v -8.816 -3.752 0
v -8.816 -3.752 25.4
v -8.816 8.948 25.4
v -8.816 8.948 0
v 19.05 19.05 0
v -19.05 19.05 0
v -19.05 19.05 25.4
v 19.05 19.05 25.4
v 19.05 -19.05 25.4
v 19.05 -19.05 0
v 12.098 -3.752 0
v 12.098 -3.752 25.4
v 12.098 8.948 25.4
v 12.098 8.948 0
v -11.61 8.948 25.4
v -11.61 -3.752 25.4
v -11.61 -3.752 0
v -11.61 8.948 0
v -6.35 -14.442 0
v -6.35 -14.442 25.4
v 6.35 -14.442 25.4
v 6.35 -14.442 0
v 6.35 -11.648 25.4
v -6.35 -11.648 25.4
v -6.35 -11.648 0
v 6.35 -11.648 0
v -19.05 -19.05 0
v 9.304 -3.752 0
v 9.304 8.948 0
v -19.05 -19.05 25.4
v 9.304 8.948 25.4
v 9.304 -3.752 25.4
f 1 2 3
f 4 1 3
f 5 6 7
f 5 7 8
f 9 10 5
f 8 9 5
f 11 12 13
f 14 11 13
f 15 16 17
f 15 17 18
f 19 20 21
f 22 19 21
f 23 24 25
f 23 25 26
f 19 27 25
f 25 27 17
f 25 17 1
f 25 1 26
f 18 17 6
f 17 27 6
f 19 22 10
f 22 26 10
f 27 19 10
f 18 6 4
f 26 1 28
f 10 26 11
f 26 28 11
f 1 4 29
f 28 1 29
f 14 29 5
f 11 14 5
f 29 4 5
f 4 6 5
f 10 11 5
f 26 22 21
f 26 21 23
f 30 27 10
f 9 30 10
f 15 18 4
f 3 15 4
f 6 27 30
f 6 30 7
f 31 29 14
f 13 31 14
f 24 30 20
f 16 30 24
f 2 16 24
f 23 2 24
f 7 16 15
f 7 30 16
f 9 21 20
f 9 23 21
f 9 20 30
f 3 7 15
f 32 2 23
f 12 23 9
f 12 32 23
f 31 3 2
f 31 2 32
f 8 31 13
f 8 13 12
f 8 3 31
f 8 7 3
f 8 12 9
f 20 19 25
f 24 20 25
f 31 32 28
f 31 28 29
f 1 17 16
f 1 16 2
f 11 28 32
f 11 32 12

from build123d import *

# Parameters (mm, degrees)
F0_W     = 38.1
F0_H     = 38.1
F0_W_2   = 12.7
F0_H_2   = 2.794
F0_W_3   = 2.794
F0_H_3   = 12.7
F1_DEPTH = 25.4
F2_DEPTH = 25.4


with BuildPart() as f1:
    # F0 (on Top) → F1 (new body)
    with BuildSketch(Plane.XY):
        Rectangle(F0_W, F0_H)
        with Locations((0, -13.044956)):
            Rectangle(F0_W_2, F0_H_2, mode=Mode.SUBTRACT)
        with Locations((-10.21277, 2.598171)):
            Rectangle(F0_W_3, F0_H_3, mode=Mode.SUBTRACT)
        with Locations((10.70081, 2.598171)):
            Rectangle(F0_W_3, F0_H_3, mode=Mode.SUBTRACT)
    extrude(amount=F1_DEPTH)

    # F0 (on Top) → F2 (cut)
    with BuildSketch(Plane.XY):
        Rectangle(F0_W, F0_H)
        with Locations((0, -13.044956)):
            Rectangle(F0_W_2, F0_H_2, mode=Mode.SUBTRACT)
        with Locations((-10.21277, 2.598171)):
            Rectangle(F0_W_3, F0_H_3, mode=Mode.SUBTRACT)
        with Locations((10.70081, 2.598171)):
            Rectangle(F0_W_3, F0_H_3, mode=Mode.SUBTRACT)
    extrude(amount=-F2_DEPTH, mode=Mode.SUBTRACT)


solid = f1.part
